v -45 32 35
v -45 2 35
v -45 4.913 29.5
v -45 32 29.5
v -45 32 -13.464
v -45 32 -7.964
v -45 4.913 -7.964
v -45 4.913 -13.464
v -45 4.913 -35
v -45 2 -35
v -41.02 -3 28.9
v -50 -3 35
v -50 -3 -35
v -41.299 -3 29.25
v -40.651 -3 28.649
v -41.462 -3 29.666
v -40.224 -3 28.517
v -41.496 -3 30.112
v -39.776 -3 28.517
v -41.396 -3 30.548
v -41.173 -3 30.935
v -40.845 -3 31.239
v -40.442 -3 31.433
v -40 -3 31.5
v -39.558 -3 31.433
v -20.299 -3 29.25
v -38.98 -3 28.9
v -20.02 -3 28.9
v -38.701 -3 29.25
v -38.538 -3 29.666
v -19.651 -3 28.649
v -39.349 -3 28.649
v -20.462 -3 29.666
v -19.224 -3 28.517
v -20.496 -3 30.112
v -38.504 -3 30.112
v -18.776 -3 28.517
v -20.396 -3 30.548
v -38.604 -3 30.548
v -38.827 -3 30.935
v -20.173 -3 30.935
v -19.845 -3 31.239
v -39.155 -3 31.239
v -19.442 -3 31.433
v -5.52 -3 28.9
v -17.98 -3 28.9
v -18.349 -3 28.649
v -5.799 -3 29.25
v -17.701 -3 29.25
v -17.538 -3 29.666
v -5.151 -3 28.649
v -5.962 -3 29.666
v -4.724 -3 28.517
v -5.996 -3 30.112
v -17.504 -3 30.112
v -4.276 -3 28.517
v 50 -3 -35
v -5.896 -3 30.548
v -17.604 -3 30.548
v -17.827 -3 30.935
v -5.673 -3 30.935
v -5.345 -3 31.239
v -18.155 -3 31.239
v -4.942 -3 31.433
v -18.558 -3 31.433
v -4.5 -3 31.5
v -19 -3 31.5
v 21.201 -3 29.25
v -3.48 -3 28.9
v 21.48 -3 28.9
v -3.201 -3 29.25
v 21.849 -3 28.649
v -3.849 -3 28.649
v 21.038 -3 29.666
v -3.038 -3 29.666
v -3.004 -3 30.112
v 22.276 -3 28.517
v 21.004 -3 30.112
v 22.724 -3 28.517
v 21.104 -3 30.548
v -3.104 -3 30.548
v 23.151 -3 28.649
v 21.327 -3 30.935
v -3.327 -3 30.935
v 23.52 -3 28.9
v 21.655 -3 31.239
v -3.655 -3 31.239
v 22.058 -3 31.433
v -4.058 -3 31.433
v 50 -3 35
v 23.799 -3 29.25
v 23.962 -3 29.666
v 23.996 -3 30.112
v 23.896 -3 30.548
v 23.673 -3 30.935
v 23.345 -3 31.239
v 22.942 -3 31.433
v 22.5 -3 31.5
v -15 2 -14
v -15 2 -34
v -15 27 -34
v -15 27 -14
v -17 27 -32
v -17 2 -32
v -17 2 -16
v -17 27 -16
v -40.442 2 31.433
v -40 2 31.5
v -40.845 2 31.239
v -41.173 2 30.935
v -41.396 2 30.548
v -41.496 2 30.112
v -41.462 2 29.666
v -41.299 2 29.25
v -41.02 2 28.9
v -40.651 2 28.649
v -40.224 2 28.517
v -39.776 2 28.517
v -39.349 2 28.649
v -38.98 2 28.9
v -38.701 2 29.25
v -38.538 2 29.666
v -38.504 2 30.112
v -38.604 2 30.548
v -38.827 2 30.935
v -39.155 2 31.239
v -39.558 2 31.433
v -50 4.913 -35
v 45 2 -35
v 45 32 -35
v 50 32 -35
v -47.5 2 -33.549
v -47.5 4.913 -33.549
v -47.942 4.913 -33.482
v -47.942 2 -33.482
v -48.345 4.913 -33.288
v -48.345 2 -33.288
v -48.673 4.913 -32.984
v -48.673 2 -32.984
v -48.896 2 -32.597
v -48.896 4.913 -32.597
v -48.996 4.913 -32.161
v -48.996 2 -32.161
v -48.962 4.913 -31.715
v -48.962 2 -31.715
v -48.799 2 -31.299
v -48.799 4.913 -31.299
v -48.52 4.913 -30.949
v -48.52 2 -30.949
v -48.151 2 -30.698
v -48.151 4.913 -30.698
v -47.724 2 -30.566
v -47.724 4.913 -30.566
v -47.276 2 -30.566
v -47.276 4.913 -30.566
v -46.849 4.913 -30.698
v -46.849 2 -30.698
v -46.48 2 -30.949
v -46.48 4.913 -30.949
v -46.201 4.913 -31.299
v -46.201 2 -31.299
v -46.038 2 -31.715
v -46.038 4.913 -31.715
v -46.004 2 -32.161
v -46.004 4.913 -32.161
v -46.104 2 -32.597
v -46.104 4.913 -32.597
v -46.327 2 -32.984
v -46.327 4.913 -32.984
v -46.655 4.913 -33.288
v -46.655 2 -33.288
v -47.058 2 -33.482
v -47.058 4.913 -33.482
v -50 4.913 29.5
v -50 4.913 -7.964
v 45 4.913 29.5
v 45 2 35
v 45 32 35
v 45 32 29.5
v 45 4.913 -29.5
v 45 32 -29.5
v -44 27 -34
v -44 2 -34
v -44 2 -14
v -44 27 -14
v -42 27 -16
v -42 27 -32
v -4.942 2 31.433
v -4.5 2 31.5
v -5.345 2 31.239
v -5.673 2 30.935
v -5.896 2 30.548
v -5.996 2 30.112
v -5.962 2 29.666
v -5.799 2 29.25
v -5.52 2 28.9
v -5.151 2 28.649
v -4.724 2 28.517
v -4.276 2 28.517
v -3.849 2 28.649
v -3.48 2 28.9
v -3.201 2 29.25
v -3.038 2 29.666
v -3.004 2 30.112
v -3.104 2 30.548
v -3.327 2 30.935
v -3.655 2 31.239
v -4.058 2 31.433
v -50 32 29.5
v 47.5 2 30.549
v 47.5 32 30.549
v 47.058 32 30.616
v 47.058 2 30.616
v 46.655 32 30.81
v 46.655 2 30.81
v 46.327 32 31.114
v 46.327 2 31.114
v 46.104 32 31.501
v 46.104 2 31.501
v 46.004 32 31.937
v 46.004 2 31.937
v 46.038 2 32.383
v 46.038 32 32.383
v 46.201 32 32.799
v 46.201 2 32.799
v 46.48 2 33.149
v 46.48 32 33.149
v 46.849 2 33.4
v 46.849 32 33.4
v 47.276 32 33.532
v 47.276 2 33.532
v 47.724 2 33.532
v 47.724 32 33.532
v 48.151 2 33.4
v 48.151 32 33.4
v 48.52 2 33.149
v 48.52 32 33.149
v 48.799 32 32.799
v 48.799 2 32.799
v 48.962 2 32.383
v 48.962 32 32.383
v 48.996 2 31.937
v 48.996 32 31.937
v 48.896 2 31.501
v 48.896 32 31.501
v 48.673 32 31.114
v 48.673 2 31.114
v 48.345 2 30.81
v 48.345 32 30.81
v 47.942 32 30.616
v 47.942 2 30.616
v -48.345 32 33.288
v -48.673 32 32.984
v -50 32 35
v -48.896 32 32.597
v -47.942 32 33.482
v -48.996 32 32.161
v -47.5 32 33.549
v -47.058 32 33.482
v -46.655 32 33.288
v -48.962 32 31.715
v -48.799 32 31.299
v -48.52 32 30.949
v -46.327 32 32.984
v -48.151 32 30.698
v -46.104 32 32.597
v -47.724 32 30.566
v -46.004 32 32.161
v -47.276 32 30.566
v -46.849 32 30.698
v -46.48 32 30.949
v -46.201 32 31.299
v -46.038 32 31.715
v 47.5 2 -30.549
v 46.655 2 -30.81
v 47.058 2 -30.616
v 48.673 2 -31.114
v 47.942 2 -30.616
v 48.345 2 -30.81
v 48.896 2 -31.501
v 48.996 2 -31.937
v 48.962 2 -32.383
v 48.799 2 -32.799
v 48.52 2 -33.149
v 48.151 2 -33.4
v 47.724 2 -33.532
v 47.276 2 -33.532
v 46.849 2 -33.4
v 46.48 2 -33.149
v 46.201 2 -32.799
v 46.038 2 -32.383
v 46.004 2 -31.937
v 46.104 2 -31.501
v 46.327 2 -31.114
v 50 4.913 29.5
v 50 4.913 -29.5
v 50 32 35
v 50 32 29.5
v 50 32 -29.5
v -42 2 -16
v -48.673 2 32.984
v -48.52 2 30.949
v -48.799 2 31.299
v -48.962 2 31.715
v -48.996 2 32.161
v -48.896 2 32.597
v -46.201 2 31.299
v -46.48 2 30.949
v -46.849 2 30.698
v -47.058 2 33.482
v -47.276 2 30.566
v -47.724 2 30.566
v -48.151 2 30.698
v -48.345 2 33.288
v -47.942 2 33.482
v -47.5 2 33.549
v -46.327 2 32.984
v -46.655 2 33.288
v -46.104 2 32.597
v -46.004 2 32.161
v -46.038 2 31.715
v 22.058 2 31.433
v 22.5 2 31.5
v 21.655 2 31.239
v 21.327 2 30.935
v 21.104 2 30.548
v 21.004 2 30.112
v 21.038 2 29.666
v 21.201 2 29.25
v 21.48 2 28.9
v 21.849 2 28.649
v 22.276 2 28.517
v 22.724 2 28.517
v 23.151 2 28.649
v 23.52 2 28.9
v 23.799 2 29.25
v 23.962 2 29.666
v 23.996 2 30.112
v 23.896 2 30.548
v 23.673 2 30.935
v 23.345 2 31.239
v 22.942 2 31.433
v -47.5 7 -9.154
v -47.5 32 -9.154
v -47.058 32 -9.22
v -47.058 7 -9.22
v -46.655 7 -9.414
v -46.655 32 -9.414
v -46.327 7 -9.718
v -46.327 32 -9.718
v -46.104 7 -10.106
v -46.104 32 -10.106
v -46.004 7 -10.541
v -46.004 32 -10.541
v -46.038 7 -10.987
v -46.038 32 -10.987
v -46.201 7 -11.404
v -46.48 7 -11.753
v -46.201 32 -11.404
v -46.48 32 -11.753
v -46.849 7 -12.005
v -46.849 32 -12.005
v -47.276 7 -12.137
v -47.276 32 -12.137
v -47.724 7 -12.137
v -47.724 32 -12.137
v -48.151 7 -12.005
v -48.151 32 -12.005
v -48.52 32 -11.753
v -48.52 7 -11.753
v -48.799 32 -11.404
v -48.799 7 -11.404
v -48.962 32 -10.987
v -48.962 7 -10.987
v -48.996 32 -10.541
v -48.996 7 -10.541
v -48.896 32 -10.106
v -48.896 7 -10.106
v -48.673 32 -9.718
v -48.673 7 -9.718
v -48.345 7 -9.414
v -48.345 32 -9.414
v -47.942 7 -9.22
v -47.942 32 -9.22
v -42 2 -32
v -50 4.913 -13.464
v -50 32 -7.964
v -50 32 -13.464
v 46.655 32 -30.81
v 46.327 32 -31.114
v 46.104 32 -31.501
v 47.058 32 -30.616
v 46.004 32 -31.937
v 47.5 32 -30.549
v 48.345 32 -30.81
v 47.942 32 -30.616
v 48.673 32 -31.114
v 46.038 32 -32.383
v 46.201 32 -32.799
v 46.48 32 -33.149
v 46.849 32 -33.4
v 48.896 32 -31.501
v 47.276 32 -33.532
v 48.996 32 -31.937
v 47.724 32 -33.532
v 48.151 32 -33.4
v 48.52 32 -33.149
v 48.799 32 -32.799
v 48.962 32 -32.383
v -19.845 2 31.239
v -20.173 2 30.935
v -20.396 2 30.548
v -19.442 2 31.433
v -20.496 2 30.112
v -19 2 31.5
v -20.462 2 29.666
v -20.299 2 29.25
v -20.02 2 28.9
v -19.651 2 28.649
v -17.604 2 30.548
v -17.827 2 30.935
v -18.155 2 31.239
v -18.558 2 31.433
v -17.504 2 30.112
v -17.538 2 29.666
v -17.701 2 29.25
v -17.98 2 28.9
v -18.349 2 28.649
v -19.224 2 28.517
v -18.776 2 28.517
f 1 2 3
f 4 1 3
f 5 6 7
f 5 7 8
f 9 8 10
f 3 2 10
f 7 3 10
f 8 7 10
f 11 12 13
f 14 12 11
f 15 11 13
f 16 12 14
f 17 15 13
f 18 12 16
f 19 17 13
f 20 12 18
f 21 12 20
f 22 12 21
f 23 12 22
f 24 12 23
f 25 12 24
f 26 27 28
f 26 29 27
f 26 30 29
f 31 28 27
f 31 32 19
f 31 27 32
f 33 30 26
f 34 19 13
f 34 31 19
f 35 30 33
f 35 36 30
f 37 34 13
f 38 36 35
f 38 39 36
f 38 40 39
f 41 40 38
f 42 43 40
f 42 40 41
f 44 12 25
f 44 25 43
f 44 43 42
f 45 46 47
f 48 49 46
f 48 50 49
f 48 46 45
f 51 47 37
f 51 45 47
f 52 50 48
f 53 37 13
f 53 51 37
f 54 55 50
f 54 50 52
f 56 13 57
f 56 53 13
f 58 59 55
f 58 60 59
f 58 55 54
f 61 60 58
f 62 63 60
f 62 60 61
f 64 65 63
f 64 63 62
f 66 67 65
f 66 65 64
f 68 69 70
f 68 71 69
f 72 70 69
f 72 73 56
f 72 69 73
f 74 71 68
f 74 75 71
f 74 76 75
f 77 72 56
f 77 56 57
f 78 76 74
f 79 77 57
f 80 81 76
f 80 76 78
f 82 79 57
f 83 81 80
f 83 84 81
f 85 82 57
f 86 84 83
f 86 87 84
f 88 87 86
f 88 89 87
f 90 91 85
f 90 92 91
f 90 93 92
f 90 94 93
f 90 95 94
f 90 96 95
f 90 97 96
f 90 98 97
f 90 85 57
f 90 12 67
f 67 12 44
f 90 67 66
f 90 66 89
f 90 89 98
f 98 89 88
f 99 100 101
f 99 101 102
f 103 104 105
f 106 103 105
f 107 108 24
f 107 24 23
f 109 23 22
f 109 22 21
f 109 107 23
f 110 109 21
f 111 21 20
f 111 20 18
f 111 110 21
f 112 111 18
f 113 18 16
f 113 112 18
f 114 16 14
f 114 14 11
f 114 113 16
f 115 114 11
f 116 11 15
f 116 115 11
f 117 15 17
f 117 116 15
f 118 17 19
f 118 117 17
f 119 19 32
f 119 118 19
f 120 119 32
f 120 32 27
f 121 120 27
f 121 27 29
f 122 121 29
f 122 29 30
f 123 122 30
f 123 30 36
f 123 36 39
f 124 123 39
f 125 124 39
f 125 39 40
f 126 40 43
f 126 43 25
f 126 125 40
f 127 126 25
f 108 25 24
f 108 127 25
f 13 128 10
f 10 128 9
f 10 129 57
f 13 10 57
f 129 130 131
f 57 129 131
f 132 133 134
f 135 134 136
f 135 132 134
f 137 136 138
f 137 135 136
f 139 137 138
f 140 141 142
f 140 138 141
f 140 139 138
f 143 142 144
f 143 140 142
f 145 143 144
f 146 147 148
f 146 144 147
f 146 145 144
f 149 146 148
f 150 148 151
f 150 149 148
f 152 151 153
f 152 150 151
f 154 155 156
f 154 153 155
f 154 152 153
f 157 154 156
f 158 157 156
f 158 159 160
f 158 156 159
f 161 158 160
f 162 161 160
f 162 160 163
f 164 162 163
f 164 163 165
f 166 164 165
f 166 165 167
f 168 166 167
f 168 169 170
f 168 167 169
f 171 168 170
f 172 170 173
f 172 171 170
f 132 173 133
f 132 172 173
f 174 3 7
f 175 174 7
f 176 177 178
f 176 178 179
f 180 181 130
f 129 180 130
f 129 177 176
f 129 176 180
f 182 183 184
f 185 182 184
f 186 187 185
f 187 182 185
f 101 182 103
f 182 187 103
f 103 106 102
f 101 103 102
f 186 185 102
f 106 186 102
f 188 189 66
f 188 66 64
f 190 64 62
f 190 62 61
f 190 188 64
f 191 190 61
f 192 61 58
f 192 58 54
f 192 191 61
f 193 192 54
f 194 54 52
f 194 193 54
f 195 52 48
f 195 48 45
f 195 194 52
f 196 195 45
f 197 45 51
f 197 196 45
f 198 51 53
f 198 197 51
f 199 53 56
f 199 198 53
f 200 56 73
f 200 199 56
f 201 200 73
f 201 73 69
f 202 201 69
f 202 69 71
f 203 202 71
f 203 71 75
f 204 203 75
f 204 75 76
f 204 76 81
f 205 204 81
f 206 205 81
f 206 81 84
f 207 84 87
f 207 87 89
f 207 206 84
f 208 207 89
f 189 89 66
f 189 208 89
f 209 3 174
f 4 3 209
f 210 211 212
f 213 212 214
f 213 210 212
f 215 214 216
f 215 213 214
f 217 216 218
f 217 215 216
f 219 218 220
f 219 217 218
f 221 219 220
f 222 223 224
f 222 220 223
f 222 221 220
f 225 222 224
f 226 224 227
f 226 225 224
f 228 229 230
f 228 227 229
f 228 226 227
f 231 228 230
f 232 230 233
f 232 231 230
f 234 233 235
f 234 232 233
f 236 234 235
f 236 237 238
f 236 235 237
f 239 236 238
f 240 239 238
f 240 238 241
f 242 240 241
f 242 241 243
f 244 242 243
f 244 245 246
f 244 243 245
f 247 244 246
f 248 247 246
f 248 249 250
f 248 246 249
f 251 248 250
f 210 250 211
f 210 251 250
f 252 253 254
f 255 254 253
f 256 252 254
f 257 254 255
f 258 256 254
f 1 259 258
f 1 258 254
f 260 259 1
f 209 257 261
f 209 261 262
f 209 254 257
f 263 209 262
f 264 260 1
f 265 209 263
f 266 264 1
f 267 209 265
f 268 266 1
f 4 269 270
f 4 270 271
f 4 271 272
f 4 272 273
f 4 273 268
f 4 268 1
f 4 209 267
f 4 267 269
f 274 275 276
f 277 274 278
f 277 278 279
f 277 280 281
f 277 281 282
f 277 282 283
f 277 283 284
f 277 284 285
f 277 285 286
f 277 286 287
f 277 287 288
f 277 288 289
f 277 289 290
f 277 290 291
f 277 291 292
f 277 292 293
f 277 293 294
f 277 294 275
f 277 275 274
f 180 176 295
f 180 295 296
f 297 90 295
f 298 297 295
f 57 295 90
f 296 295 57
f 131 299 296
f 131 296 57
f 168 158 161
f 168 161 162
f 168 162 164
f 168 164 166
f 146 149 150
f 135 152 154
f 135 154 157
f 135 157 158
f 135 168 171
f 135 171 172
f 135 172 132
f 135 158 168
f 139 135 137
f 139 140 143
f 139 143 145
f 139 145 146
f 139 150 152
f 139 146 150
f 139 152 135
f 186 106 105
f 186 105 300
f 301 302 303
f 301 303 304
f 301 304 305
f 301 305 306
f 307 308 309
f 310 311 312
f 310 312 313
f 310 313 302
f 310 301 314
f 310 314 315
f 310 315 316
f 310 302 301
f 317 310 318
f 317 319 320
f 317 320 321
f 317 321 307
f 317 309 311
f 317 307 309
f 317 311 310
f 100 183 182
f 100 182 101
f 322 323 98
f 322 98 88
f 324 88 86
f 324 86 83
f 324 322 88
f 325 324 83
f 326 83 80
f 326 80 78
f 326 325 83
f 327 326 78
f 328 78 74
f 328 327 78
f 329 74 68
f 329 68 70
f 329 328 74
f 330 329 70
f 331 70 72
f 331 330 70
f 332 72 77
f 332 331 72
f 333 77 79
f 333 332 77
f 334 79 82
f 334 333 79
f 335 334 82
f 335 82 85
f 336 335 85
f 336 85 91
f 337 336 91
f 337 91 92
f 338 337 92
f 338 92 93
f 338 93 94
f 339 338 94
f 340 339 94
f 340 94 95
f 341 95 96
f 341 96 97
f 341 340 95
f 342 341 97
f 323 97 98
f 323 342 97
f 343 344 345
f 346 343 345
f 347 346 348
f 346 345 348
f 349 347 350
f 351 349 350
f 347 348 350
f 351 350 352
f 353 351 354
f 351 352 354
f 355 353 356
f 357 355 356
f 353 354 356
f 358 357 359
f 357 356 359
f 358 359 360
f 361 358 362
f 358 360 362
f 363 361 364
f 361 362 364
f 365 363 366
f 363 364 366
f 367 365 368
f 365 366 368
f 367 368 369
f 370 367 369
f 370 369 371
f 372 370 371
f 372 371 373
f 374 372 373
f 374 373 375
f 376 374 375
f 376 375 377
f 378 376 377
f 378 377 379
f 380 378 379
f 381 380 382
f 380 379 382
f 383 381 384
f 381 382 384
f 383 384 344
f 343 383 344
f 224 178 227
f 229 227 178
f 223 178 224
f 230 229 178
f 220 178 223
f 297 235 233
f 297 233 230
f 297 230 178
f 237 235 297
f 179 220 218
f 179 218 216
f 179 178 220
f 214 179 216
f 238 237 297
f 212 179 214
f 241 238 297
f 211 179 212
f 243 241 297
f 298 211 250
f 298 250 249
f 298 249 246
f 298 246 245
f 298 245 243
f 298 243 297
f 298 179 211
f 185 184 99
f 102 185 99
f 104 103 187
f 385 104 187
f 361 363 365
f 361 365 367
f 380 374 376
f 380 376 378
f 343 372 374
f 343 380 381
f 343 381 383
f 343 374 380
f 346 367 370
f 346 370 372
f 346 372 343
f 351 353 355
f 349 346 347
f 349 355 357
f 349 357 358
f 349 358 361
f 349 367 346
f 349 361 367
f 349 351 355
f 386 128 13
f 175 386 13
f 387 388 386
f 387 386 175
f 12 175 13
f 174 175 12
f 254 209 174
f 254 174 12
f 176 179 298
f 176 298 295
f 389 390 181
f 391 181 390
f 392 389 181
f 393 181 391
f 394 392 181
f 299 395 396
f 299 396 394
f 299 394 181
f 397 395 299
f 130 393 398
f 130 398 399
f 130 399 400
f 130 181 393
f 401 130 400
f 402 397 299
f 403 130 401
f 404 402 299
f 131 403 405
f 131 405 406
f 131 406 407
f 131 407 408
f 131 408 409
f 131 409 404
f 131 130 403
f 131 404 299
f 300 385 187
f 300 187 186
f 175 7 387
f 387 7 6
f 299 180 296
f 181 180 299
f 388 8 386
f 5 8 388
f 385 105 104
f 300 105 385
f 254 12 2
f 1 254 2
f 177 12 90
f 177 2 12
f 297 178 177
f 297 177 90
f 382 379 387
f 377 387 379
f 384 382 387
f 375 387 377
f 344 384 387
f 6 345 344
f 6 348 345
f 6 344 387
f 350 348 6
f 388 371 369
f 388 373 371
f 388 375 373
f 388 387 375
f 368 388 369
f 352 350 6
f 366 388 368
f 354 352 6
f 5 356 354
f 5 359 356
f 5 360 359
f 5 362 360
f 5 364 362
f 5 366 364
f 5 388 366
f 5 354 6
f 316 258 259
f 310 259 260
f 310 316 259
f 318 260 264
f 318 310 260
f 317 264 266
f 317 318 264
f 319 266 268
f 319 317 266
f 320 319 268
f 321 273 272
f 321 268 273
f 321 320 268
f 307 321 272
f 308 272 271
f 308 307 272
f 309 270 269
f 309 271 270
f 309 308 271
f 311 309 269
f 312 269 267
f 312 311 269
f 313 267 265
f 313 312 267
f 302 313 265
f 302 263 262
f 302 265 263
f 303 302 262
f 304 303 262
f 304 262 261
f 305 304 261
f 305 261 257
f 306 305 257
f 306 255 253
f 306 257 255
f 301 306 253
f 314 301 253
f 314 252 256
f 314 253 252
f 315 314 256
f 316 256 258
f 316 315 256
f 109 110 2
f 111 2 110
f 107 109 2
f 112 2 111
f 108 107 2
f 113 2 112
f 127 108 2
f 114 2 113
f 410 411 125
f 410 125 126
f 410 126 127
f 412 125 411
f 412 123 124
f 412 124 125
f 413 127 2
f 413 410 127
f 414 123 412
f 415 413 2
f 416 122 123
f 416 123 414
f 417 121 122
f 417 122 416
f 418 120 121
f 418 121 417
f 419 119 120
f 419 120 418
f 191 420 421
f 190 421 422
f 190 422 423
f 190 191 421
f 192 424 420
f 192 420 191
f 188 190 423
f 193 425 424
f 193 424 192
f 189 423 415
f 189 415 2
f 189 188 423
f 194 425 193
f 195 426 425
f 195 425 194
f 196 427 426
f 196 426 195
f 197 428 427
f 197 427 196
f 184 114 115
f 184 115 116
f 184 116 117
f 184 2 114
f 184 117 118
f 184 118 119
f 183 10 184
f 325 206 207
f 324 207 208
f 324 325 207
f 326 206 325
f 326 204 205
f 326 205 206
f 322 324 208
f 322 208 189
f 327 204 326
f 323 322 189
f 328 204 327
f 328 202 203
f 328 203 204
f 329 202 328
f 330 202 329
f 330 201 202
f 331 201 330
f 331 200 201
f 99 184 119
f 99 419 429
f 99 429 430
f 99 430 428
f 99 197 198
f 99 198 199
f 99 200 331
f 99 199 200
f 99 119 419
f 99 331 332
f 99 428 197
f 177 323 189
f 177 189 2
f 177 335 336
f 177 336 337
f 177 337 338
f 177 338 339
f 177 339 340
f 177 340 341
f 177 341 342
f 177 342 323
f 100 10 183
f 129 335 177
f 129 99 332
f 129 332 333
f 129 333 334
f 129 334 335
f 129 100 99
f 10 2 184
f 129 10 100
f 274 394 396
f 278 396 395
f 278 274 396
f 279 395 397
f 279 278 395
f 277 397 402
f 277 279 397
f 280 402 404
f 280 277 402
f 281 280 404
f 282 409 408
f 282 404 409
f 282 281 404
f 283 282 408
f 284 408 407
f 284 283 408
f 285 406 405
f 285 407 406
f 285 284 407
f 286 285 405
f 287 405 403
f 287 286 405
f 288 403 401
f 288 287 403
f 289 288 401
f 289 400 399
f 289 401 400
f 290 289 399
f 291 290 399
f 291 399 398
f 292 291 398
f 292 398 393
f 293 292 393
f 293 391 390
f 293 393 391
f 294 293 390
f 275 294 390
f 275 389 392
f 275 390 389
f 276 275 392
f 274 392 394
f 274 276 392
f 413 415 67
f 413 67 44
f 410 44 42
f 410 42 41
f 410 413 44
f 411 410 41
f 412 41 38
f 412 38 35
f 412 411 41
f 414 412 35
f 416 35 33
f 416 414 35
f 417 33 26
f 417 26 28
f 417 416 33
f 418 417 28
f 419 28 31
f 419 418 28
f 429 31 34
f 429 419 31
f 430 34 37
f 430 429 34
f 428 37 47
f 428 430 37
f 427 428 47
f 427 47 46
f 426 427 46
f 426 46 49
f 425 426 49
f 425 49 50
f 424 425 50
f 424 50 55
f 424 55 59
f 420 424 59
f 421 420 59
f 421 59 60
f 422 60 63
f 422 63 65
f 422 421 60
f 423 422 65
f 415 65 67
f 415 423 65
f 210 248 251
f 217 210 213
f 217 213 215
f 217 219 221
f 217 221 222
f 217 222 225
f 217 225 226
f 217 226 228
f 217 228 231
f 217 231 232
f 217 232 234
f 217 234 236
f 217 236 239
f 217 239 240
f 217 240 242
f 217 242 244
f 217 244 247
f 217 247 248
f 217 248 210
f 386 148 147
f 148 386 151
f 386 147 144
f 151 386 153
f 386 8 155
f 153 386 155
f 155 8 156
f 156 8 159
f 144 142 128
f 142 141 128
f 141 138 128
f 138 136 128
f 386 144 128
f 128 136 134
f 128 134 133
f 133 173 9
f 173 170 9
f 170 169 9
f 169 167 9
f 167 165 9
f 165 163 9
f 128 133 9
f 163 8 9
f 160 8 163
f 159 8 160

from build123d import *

# Parameters (mm, degrees)
SKETCH1_W               = 90
SKETCH1_H               = 70
BOSS_EXTRUDE1_DEPTH     = 2
SKETCH2_W               = 90
SKETCH2_H               = 70
BOSS_EXTRUDE2_DEPTH     = 5
CUT_EXTRUDE2_START      = -2
SKETCH3_R               = 1.5
CUT_EXTRUDE2_DEPTH      = 5
SKETCH9_W               = 5
SKETCH9_H               = 70
BOSS_EXTRUDE6_DEPTH     = 2
SKETCH9_2_W             = 5
SKETCH9_2_H             = 70
BOSS_EXTRUDE7_DEPTH     = 30
SKETCH11_R              = 1.5
CUT_EXTRUDE6_DEPTH      = 69.007352544
CUT_EXTRUDE7_DEPTH      = 111.675200474
CUT_EXTRUDE7_DEPTH_BACK = 10
BOSS_EXTRUDE8_START     = -2
SKETCH12_W              = 29
SKETCH12_H              = 20
BOSS_EXTRUDE8_DEPTH     = 25
SKETCH13_W              = 25
SKETCH13_H              = 16
CUT_EXTRUDE8_DEPTH      = 25
SKETCH14_W              = 21.535675489
SKETCH14_H              = 27.087328124
SKETCH14_W_2            = 37.464324511
CUT_EXTRUDE9_DEPTH      = 25
SKETCH15_R              = 1.5
CUT_EXTRUDE10_DEPTH     = 25
BOSS_EXTRUDE9_START     = -3
SKETCH16_W              = 5
SKETCH16_H              = 70
BOSS_EXTRUDE9_DEPTH     = 3


with BuildPart() as part:
    # Sketch1 → Boss-Extrude1 (new body)
    with BuildSketch(Plane(origin=(0, 0, 0), x_dir=(1, 0, 0), z_dir=(0, 1, 0))):
        Rectangle(SKETCH1_W, SKETCH1_H)
    extrude(amount=BOSS_EXTRUDE1_DEPTH)

    # Sketch2 → Boss-Extrude2 (add)
    with BuildSketch(Plane(origin=(0, 2, 0), x_dir=(1, 0, 0), z_dir=(0, 1, 0))):
        Rectangle(SKETCH2_W, SKETCH2_H)
    extrude(amount=-BOSS_EXTRUDE2_DEPTH)

    # Sketch3 → Cut-Extrude2 (cut)
    with BuildSketch(Plane.XZ.offset(CUT_EXTRUDE2_START)):
        with Locations(Location((-40, 30, 0), (0, 0, 90))):
            Circle(SKETCH3_R)
        with Locations(Location((-19, 30, 0), (0, 0, 90))):
            Circle(SKETCH3_R)
        with Locations(Location((-4.5, 30, 0), (0, 0, 90))):
            Circle(SKETCH3_R)
        with Locations(Location((22.5, 30, 0), (0, 0, 90))):
            Circle(SKETCH3_R)
    extrude(amount=CUT_EXTRUDE2_DEPTH, mode=Mode.SUBTRACT)

    # Sketch9 → Boss-Extrude6 (add)
    with BuildSketch(Plane(origin=(0, 2, 0), x_dir=(1, 0, 0), z_dir=(0, 1, 0))):
        with Locations((-47.5, 0)):
            Rectangle(SKETCH9_W, SKETCH9_H)
        with Locations((47.5, 0)):
            Rectangle(SKETCH9_W, SKETCH9_H)
    extrude(amount=-BOSS_EXTRUDE6_DEPTH)

    # Sketch9<2> → Boss-Extrude7 (add)
    with BuildSketch(Plane(origin=(0, 2, 0), x_dir=(1, 0, 0), z_dir=(0, 1, 0))):
        with Locations((-47.5, 0)):
            Rectangle(SKETCH9_2_W, SKETCH9_2_H)
        with Locations((47.5, 0)):
            Rectangle(SKETCH9_2_W, SKETCH9_2_H)
    extrude(amount=BOSS_EXTRUDE7_DEPTH)

    # Sketch11 → Cut-Extrude6 (cut, through all)
    with BuildSketch(Plane(origin=(0, 2, 0), x_dir=(1, 0, 0), z_dir=(0, 1, 0))):
        with Locations(Location((-47.5, -32.049006617, 0), (0, 0, 270))):
            Circle(SKETCH11_R)
        with Locations(Location((-47.5, 32.049006617, 0), (0, 0, 90))):
            Circle(SKETCH11_R)
        with Locations(Location((47.5, 32.049006617, 0), (0, 0, 270))):
            Circle(SKETCH11_R)
        with Locations(Location((47.5, -32.049006617, 0), (0, 0, 90))):
            Circle(SKETCH11_R)
    extrude(amount=CUT_EXTRUDE6_DEPTH, mode=Mode.SUBTRACT)

    # Sketch10 → Cut-Extrude7 (cut, two sides: drawn at the far end of the back side and taken through both)
    with BuildSketch(Plane(origin=(50, 0, 0), x_dir=(0, 0, -1), z_dir=(1, 0, 0)).offset(-CUT_EXTRUDE7_DEPTH_BACK)):
        Polygon((-29.5, 26.895487084), (-29.5, 7.104512916), (-29.5, 4.912671876), (29.5, 4.912671876), (29.5, 29.087328124), (29.5, 32), (-29.5, 32), (-29.5, 29.087328124), align=None)
    extrude(amount=CUT_EXTRUDE7_DEPTH + CUT_EXTRUDE7_DEPTH_BACK, mode=Mode.SUBTRACT)

    # Sketch12 → Boss-Extrude8 (add)
    with BuildSketch(Plane.XZ.offset(BOSS_EXTRUDE8_START)):
        with Locations((-29.5, -24)):
            Rectangle(SKETCH12_W, SKETCH12_H)
    extrude(amount=-BOSS_EXTRUDE8_DEPTH)

    # Sketch13 → Cut-Extrude8 (cut)
    with BuildSketch(Plane(origin=(0, 27, 0), x_dir=(-1, 0, 0), z_dir=(0, 1, 0))):
        with Locations((29.5, -24)):
            Rectangle(SKETCH13_W, SKETCH13_H)
    extrude(amount=-CUT_EXTRUDE8_DEPTH, mode=Mode.SUBTRACT)

    # Sketch14 → Cut-Extrude9 (cut)
    with BuildSketch(Plane(origin=(-45, 0, 0), x_dir=(0, 0, -1), z_dir=(1, 0, 0))):
        with Locations((24.232162256, 18.456335938)):
            Rectangle(SKETCH14_W, SKETCH14_H)
        with Locations((-10.767837745, 18.456335938)):
            Rectangle(SKETCH14_W_2, SKETCH14_H)
    extrude(amount=-CUT_EXTRUDE9_DEPTH, mode=Mode.SUBTRACT)

    # Sketch15 → Cut-Extrude10 (cut)
    with BuildSketch(Plane(origin=(0, 32, 0), x_dir=(1, 0, 0), z_dir=(0, 1, 0))):
        with Locations(Location((-47.5, 10.653576943, 0), (0, 0, 270))):
            Circle(SKETCH15_R)
    extrude(amount=-CUT_EXTRUDE10_DEPTH, mode=Mode.SUBTRACT)

    # Sketch16 → Boss-Extrude9 (add)
    with BuildSketch(Plane.XZ.offset(3).offset(BOSS_EXTRUDE9_START)):
        with Locations((-47.5, 0)):
            Rectangle(SKETCH16_W, SKETCH16_H)
        with Locations((47.5, 0)):
            Rectangle(SKETCH16_W, SKETCH16_H)
    extrude(amount=BOSS_EXTRUDE9_DEPTH)


solid = part.part
